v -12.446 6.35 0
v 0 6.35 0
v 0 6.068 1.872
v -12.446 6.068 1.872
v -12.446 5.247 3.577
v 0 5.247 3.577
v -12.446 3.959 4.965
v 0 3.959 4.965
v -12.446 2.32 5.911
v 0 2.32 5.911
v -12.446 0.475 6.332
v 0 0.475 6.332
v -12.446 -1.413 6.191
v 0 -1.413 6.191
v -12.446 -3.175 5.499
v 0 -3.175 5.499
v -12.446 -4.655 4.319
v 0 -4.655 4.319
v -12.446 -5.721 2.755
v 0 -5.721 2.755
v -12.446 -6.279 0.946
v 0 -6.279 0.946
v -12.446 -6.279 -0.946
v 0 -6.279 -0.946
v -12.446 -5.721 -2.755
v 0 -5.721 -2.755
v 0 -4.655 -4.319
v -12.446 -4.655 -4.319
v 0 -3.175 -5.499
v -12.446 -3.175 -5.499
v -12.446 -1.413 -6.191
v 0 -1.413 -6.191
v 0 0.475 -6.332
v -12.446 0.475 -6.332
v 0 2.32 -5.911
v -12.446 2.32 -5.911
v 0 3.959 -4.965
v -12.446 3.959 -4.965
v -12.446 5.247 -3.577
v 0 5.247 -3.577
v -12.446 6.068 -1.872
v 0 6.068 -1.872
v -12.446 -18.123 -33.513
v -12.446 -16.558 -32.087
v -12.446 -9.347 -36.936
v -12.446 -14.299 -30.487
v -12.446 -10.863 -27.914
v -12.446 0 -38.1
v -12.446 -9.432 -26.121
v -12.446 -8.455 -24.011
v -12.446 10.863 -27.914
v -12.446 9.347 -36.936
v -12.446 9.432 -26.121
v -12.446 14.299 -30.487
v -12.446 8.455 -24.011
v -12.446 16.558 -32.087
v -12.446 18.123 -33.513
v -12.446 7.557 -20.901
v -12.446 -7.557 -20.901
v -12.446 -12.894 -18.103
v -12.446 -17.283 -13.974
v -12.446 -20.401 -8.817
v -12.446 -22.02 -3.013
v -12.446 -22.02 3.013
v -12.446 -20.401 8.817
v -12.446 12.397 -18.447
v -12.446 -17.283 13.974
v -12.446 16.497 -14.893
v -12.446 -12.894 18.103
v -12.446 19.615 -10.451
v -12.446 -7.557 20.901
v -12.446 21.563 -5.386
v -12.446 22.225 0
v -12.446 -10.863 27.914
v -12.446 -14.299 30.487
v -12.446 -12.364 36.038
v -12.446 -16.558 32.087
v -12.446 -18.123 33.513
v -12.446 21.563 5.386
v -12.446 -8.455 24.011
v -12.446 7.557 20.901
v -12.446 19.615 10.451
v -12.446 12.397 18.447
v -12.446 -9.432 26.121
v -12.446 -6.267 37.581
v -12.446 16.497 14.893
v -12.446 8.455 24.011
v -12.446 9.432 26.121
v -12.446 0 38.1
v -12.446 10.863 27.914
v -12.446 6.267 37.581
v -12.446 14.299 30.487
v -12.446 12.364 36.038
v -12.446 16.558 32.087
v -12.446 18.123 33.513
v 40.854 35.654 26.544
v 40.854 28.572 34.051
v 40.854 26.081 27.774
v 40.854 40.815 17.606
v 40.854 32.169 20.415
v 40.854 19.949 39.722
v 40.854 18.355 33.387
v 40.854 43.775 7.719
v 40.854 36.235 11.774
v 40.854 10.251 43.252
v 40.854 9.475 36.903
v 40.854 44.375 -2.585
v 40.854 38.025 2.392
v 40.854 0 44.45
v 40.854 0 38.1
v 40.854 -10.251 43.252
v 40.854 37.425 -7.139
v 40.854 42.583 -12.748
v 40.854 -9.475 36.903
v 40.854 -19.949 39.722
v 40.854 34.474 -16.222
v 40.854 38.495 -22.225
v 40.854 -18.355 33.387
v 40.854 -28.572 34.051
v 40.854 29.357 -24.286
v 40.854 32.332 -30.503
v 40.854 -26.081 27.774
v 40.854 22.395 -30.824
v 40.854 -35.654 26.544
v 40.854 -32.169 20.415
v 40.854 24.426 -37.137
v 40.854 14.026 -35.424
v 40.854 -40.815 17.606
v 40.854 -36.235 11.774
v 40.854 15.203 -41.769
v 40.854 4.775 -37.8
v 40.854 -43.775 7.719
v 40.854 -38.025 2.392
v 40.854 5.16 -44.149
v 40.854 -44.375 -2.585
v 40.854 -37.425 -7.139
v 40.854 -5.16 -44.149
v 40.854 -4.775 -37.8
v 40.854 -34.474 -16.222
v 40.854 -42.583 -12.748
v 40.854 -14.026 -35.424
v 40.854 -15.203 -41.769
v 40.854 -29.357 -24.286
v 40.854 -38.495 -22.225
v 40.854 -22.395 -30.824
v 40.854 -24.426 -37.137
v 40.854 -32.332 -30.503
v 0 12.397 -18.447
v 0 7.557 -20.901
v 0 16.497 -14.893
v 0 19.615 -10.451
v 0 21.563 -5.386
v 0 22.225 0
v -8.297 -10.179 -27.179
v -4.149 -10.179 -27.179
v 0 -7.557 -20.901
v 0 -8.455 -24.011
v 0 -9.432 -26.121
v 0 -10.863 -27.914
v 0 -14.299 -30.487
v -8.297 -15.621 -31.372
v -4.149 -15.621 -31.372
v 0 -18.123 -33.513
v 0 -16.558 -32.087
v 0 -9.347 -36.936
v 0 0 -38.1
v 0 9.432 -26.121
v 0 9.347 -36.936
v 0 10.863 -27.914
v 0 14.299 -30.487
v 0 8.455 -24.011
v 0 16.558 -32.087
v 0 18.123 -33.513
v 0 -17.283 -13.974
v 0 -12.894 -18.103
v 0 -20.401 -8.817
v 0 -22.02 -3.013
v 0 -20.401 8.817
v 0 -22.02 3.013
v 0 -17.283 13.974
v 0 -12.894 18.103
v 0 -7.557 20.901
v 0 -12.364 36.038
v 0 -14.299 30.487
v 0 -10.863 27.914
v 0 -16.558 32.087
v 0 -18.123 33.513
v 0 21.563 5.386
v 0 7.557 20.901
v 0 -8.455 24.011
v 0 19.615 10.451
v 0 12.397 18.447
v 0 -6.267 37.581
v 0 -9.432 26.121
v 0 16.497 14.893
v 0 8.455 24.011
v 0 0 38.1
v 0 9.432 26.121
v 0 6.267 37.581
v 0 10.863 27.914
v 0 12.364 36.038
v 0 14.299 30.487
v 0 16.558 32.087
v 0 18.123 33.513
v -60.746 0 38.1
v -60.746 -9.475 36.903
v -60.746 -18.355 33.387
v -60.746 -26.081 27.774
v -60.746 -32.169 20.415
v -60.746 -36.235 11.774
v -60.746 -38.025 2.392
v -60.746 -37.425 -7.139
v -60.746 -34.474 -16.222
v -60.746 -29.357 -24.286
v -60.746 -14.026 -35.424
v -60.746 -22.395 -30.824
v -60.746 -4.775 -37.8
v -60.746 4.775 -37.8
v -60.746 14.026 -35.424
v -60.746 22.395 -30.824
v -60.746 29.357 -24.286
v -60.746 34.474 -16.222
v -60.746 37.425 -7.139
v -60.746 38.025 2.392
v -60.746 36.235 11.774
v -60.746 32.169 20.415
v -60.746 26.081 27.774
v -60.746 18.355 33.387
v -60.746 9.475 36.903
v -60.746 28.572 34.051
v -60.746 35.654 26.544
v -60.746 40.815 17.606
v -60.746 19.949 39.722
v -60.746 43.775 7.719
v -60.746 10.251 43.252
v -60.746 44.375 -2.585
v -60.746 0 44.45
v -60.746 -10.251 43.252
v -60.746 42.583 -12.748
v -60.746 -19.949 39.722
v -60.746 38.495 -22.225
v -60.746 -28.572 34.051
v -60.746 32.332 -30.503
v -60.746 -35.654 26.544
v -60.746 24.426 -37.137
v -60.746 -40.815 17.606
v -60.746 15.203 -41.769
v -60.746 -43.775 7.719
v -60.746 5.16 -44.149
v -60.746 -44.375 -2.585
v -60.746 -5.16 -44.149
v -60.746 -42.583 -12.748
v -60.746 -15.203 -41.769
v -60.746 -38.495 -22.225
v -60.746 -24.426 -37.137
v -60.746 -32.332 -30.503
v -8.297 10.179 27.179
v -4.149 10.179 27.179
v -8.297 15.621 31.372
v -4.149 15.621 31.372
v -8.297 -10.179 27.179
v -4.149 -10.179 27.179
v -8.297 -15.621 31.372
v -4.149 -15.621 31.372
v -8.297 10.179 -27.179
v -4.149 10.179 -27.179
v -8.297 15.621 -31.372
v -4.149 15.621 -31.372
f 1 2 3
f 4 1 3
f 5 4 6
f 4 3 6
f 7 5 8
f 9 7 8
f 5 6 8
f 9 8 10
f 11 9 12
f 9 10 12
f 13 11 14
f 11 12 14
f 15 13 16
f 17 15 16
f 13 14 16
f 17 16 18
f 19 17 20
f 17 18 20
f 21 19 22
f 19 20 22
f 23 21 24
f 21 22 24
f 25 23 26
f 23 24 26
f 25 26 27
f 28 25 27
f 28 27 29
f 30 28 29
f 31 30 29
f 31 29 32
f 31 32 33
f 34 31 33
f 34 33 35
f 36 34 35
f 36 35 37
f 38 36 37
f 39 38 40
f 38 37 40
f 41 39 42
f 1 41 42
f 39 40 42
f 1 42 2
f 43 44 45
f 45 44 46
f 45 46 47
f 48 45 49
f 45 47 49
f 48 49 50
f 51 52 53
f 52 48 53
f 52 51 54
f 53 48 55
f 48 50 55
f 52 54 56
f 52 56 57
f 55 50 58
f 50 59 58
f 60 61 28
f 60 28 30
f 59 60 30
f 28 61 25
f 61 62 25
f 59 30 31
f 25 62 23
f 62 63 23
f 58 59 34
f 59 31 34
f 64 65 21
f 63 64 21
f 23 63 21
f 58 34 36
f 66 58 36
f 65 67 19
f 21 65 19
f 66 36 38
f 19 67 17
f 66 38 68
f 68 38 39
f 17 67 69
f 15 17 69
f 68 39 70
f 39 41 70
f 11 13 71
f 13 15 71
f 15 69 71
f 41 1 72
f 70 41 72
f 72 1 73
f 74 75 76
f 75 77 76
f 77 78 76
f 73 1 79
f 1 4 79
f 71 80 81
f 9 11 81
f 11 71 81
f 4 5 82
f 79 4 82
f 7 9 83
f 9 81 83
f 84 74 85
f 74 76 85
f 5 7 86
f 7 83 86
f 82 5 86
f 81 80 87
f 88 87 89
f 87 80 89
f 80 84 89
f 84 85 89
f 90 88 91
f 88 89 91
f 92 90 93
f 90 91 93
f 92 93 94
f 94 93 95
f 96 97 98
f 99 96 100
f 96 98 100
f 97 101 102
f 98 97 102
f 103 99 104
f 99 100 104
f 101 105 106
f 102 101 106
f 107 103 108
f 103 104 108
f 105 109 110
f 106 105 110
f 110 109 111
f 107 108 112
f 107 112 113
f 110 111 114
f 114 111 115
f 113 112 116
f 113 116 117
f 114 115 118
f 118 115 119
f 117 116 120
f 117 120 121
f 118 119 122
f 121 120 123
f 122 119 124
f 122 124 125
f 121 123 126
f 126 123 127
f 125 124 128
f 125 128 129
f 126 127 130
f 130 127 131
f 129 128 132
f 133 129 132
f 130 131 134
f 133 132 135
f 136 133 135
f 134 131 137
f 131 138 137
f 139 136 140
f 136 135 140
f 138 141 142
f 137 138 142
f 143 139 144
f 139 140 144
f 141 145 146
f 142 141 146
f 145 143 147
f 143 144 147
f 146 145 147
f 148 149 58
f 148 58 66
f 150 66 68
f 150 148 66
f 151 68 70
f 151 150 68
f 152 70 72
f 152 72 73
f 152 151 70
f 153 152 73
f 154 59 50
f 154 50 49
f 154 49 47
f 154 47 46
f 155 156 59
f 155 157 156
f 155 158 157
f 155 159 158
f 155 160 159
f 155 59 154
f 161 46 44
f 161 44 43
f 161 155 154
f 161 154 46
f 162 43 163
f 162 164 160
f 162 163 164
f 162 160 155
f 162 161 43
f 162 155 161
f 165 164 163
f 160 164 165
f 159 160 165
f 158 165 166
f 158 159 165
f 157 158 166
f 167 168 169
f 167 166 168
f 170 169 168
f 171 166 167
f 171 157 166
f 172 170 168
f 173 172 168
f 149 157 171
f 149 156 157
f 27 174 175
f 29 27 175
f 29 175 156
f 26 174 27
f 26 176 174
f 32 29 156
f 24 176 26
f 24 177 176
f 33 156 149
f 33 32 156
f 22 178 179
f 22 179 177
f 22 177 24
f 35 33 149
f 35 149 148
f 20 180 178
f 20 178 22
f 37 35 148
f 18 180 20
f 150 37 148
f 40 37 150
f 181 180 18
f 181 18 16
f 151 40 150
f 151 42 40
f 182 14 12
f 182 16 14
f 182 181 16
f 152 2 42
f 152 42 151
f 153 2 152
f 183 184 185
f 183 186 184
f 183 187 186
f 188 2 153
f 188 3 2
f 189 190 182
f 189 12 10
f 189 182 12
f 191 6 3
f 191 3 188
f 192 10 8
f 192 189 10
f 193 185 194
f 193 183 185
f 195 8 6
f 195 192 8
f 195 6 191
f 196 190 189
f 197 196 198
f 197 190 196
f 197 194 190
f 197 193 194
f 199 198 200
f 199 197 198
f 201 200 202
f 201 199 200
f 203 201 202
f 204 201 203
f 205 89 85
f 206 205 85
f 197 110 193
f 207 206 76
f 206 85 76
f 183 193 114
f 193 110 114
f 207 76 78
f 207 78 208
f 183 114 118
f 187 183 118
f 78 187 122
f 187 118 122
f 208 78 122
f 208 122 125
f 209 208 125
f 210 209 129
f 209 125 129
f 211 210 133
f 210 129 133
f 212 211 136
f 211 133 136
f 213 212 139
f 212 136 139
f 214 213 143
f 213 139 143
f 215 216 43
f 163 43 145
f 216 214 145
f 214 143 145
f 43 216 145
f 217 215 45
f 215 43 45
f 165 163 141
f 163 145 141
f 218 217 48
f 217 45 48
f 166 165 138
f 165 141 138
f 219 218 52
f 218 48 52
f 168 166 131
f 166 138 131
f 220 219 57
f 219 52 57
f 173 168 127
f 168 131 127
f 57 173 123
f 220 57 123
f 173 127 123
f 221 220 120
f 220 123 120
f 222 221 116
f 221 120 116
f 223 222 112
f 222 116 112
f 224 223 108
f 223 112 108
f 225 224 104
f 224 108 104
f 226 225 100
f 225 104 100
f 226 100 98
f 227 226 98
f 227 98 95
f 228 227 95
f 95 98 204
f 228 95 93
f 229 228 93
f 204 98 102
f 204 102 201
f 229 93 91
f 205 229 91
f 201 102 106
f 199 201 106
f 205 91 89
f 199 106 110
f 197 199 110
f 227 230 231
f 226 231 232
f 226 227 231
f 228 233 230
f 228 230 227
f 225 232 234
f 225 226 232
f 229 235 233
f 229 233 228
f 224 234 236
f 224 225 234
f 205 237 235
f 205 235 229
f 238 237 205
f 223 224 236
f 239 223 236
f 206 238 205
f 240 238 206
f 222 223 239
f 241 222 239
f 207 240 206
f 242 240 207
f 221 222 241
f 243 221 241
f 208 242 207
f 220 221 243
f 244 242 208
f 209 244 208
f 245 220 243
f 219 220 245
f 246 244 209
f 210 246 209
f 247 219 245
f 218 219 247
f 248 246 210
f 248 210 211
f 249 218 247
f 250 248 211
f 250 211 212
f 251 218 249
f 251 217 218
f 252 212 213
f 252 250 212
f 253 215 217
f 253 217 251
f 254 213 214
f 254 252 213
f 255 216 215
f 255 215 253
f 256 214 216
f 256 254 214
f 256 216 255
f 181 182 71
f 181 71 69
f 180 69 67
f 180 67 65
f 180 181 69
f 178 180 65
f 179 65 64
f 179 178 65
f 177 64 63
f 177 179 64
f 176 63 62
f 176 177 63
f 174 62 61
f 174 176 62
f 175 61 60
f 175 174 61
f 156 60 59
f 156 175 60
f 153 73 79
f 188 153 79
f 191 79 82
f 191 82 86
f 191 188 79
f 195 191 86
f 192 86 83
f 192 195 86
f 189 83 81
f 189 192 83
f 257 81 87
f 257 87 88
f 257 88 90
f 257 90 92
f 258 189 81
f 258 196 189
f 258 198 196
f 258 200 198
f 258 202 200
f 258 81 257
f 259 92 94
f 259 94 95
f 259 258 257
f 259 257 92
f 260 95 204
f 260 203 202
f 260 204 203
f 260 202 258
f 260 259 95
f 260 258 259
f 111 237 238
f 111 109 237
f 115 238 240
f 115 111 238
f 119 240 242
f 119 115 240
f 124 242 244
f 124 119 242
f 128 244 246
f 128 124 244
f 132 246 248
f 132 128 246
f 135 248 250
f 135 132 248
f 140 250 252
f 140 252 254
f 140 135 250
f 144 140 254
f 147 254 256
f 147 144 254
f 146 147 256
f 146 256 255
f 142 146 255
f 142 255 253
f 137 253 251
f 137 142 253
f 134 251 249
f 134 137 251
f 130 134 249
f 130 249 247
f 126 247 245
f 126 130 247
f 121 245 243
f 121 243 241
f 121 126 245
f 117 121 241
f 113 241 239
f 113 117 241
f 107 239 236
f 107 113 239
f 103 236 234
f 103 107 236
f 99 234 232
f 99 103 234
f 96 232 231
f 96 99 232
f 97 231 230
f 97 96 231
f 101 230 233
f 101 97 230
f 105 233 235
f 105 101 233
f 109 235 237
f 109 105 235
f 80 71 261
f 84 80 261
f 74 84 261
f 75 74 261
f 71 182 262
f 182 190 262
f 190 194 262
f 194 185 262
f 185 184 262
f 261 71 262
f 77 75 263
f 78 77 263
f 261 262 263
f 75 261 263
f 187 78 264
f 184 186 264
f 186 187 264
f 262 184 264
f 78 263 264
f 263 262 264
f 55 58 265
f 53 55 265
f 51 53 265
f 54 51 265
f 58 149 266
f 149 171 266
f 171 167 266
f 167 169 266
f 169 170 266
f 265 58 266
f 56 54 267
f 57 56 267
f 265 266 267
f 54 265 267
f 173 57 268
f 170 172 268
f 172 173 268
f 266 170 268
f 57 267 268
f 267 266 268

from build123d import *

# Parameters (mm, degrees)
F0_W     = 101.6
F0_H     = 6.35
F2_R     = 6.35
F3_DEPTH = 12.446


with BuildPart() as f1:
    # F0 (on Front) → F1 (revolve)
    with BuildSketch(Plane.XZ):
        with Locations((-9.9456323085, 41.275)):
            Rectangle(F0_W, F0_H)
    revolve(axis=Axis((-36.8506624945, 0, 0), (1, 0, 0)))

    # F2 (on Right) → F3 (join)
    with BuildSketch(Plane.YZ):
        with BuildLine():
            ThreePointArc((-7.5566940289, 20.9008851572), (0, 22.225), (7.5566940289, 20.9008851572))
            add(Edge.make_bspline(
                [(7.5566940289, 20.9008851572), (8.1307940533, 23.1498468847), (9.2859974924, 27.6739638996), (15.6936893767, 31.1495582912), (17.4205445494, 32.8370367229), (18.1234413691, 33.5134431675)],
                knots=[0, 0, 0, 0, 0.3703034477, 0.7423878019, 1, 1, 1, 1], degree=3))
            ThreePointArc((18.1234413691, 33.5134431675), (0, 38.1), (-18.1234413691, 33.5134431675))
            add(Edge.make_bspline(
                [(-7.5566940289, 20.9008851572), (-8.1307940533, 23.1498468847), (-9.2859974924, 27.6739638996), (-15.6936893767, 31.1495582912), (-17.4205445494, 32.8370367229), (-18.1234413691, 33.5134431675)],
                knots=[0, 0, 0, 0, 0.3703034477, 0.7423878019, 1, 1, 1, 1], degree=3))
        make_face()
        with BuildLine():
            ThreePointArc((7.5566940289, -20.9008851572), (18.1920057964, -12.7672060414), (22.225, 0))
            ThreePointArc((22.225, 0), (18.1920057964, 12.7672060414), (7.5566940289, 20.9008851572))
            ThreePointArc((7.5566940289, 20.9008851572), (0, 22.225), (-7.5566940289, 20.9008851572))
            ThreePointArc((-7.5566940289, 20.9008851572), (-22.225, 0), (-7.5566940289, -20.9008851572))
            ThreePointArc((-7.5566940289, -20.9008851572), (0, -22.225), (7.5566940289, -20.9008851572))
        make_face()
        Circle(F2_R, mode=Mode.SUBTRACT)
        with BuildLine():
            add(Edge.make_bspline(
                [(7.5566940289, -20.9008851572), (8.1307940533, -23.1498468847), (9.2859974924, -27.6739638996), (15.6936893767, -31.1495582912), (17.4205445494, -32.8370367229), (18.1234413691, -33.5134431675)],
                knots=[0, 0, 0, 0, 0.3703034477, 0.7423878019, 1, 1, 1, 1], degree=3))
            ThreePointArc((7.5566940289, -20.9008851572), (0, -22.225), (-7.5566940289, -20.9008851572))
            add(Edge.make_bspline(
                [(-7.5566940289, -20.9008851572), (-8.1307940533, -23.1498468847), (-9.2859974924, -27.6739638996), (-15.6936893767, -31.1495582912), (-17.4205445494, -32.8370367229), (-18.1234413691, -33.5134431675)],
                knots=[0, 0, 0, 0, 0.3703034477, 0.7423878019, 1, 1, 1, 1], degree=3))
            ThreePointArc((-18.1234413691, -33.5134431675), (0, -38.1), (18.1234413691, -33.5134431675))
        make_face()
    extrude(amount=-F3_DEPTH)


solid = f1.part
